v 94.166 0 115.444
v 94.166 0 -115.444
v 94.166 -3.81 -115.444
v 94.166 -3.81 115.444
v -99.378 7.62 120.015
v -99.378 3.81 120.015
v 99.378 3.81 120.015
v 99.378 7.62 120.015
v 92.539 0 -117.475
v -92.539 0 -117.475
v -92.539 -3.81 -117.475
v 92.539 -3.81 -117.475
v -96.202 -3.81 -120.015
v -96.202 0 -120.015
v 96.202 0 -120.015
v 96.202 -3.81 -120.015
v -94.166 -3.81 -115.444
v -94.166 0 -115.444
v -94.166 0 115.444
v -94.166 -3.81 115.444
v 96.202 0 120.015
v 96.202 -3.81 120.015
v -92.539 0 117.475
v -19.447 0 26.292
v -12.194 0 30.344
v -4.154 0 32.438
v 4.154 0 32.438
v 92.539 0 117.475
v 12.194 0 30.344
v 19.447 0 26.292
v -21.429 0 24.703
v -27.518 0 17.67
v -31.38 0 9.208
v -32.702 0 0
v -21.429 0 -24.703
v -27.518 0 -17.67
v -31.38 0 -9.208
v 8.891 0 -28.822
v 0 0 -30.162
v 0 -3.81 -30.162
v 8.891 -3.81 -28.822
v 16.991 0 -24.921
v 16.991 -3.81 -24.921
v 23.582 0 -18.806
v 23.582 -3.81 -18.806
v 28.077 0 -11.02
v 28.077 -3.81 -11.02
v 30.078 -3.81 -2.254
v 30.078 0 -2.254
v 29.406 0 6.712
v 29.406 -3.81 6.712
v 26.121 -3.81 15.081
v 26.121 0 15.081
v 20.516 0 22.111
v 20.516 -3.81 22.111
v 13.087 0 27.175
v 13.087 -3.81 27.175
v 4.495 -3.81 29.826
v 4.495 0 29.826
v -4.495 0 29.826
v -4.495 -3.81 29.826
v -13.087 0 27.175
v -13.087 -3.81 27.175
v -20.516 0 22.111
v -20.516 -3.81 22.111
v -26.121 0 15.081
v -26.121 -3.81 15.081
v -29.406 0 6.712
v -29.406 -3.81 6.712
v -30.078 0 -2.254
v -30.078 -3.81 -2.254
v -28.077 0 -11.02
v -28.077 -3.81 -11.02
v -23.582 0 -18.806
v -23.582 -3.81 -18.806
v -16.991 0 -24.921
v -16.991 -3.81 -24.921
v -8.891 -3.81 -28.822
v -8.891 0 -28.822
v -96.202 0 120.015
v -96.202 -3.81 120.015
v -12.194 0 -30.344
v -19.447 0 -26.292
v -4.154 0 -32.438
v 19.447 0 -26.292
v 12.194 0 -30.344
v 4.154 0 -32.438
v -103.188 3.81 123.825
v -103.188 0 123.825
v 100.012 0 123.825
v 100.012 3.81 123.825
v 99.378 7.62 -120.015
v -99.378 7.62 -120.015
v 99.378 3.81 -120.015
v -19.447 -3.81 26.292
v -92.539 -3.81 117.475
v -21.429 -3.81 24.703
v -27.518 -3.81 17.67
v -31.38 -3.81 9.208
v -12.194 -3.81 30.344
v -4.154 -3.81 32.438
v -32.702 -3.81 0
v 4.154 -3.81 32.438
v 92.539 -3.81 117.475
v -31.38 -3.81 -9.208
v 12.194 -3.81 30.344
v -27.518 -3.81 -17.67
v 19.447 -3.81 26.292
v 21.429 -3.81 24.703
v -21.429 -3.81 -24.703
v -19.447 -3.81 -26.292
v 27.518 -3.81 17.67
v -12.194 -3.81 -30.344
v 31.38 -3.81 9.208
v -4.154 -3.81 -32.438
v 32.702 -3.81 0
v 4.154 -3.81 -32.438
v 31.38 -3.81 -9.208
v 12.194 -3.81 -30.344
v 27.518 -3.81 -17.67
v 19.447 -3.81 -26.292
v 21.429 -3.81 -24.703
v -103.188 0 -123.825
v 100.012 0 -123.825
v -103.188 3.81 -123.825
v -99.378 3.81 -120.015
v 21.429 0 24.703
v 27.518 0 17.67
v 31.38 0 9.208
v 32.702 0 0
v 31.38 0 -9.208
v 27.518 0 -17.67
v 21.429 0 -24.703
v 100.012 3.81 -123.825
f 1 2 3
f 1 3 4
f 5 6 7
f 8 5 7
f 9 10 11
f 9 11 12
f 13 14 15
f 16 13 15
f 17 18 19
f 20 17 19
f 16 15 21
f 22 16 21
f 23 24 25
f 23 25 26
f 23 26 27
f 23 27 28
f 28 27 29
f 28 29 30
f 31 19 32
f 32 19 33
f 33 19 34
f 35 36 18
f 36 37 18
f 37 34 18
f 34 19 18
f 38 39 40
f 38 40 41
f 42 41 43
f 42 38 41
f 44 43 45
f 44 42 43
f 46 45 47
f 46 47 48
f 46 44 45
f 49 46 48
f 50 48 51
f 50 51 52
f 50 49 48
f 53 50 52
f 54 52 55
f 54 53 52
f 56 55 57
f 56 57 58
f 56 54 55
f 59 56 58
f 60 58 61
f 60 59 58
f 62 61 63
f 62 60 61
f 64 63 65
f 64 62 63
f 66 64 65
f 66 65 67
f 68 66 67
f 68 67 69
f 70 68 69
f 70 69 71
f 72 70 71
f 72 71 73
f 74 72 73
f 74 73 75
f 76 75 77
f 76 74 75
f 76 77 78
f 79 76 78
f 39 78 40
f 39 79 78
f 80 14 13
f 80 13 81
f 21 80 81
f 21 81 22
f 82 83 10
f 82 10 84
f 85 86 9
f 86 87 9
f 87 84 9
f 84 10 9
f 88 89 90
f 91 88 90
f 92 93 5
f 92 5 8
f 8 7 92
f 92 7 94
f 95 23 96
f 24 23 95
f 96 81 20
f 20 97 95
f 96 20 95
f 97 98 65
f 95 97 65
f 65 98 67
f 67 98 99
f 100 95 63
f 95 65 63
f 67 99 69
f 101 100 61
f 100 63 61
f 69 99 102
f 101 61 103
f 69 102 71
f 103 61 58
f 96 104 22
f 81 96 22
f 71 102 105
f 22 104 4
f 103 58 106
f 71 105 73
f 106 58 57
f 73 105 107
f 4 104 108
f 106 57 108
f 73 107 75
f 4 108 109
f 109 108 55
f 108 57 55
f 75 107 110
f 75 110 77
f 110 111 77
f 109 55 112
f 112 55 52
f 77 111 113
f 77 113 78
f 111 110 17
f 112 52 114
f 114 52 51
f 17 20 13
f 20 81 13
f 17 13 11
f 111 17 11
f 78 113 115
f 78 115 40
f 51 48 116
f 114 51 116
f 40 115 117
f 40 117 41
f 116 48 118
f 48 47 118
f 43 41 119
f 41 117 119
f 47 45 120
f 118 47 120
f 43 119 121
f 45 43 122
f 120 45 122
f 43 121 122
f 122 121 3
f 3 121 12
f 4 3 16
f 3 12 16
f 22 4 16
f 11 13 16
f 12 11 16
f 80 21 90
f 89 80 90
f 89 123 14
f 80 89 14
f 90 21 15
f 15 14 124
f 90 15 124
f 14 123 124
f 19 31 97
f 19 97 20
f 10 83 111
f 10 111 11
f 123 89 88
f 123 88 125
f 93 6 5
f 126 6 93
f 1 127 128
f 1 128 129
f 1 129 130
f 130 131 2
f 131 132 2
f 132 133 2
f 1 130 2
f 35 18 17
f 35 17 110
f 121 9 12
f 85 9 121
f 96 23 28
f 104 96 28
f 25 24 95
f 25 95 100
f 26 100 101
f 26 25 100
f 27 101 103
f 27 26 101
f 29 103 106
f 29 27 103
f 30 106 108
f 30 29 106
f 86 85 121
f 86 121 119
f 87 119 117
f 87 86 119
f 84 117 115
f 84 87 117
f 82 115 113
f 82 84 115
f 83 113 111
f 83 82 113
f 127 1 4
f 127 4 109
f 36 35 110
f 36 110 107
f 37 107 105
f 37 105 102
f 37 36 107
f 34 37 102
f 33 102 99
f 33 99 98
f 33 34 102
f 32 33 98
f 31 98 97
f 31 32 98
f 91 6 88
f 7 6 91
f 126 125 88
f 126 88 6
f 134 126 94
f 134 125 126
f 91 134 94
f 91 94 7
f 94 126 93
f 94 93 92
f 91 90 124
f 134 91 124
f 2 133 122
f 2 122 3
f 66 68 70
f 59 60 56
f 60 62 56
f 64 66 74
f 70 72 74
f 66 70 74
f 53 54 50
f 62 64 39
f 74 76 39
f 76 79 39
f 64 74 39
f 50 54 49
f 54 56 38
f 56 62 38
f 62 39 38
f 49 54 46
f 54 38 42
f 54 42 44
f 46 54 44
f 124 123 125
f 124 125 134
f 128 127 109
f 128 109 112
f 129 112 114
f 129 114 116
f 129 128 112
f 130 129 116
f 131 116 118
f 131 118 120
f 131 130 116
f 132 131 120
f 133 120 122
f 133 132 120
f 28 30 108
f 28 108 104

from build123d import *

# Parameters (mm, degrees)
SKETCH1_W           = 203.2
SKETCH1_H           = 247.65
BOSS_EXTRUDE1_DEPTH = 3.81
SKETCH2_W           = 198.755
SKETCH2_H           = 240.03
BOSS_EXTRUDE2_DEPTH = 3.81
SKETCH3_W           = 192.405
SKETCH3_H           = 240.03
SKETCH3_W_2         = 188.332936508
SKETCH3_H_2         = 234.95
BOSS_EXTRUDE3_DEPTH = 3.81
SKETCH4_R           = 30.1625
BOSS_EXTRUDE4_DEPTH = 3.81


with BuildPart() as part:
    # Sketch1 → Boss-Extrude1 (new body)
    with BuildSketch(Plane(origin=(0, 0, 0), x_dir=(1, 0, 0), z_dir=(0, 1, 0))):
        with Locations((-1.5875, 0)):
            Rectangle(SKETCH1_W, SKETCH1_H)
    extrude(amount=BOSS_EXTRUDE1_DEPTH)

    # Sketch2 → Boss-Extrude2 (add)
    with BuildSketch(Plane(origin=(0, 3.81, 0), x_dir=(1, 0, 0), z_dir=(0, 1, 0))):
        Rectangle(SKETCH2_W, SKETCH2_H)
    extrude(amount=BOSS_EXTRUDE2_DEPTH)

    # Sketch3 → Boss-Extrude3 (add)
    with BuildSketch(Plane.XZ):
        Rectangle(SKETCH3_W, SKETCH3_H)
        Rectangle(SKETCH3_W_2, SKETCH3_H_2, mode=Mode.SUBTRACT)
    extrude(amount=BOSS_EXTRUDE3_DEPTH)

    # Sketch4 → Boss-Extrude4 (add)
    with BuildSketch(Plane(origin=(0, 0, 0), x_dir=(-1, 0, 0), z_dir=(0, -1, 0))):
        with BuildLine():
            Line((-92.538814631, 117.475), (-19.447411716, 26.291665671))
            ThreePointArc((-19.447411716, 26.291665671), (0, 32.7025), (19.447411716, 26.291665671))
            Line((19.447411716, 26.291665671), (92.538814631, 117.475))
            Line((92.538814631, 117.475), (94.166468254, 117.475))
            Line((94.166468254, 117.475), (94.166468254, 115.444461816))
            Line((94.166468254, 115.444461816), (21.429283015, 24.703022805))
            ThreePointArc((21.429283015, 24.703022805), (32.7025, 0), (21.429283015, -24.703022805))
            Line((21.429283015, -24.703022805), (94.166468254, -115.444461816))
            Line((94.166468254, -115.444461816), (94.166468254, -117.475))
            Line((94.166468254, -117.475), (92.538814631, -117.475))
            Line((92.538814631, -117.475), (19.447411716, -26.291665671))
            ThreePointArc((19.447411716, -26.291665671), (0, -32.7025), (-19.447411716, -26.291665671))
            Line((-19.447411716, -26.291665671), (-92.538814631, -117.475))
            Line((-92.538814631, -117.475), (-94.166468254, -117.475))
            Line((-94.166468254, -117.475), (-94.166468254, -115.444461816))
            Line((-94.166468254, -115.444461816), (-21.429283015, -24.703022805))
            ThreePointArc((-21.429283015, -24.703022805), (-32.7025, 0), (-21.429283015, 24.703022805))
            Line((-21.429283015, 24.703022805), (-94.166468254, 115.444461816))
            Line((-94.166468254, 115.444461816), (-94.166468254, 117.475))
            Line((-94.166468254, 117.475), (-92.538814631, 117.475))
        make_face()
        with Locations(Location((0, 0, 0), (0, 0, 90))):
            Circle(SKETCH4_R, mode=Mode.SUBTRACT)
    extrude(amount=BOSS_EXTRUDE4_DEPTH)


solid = part.part
